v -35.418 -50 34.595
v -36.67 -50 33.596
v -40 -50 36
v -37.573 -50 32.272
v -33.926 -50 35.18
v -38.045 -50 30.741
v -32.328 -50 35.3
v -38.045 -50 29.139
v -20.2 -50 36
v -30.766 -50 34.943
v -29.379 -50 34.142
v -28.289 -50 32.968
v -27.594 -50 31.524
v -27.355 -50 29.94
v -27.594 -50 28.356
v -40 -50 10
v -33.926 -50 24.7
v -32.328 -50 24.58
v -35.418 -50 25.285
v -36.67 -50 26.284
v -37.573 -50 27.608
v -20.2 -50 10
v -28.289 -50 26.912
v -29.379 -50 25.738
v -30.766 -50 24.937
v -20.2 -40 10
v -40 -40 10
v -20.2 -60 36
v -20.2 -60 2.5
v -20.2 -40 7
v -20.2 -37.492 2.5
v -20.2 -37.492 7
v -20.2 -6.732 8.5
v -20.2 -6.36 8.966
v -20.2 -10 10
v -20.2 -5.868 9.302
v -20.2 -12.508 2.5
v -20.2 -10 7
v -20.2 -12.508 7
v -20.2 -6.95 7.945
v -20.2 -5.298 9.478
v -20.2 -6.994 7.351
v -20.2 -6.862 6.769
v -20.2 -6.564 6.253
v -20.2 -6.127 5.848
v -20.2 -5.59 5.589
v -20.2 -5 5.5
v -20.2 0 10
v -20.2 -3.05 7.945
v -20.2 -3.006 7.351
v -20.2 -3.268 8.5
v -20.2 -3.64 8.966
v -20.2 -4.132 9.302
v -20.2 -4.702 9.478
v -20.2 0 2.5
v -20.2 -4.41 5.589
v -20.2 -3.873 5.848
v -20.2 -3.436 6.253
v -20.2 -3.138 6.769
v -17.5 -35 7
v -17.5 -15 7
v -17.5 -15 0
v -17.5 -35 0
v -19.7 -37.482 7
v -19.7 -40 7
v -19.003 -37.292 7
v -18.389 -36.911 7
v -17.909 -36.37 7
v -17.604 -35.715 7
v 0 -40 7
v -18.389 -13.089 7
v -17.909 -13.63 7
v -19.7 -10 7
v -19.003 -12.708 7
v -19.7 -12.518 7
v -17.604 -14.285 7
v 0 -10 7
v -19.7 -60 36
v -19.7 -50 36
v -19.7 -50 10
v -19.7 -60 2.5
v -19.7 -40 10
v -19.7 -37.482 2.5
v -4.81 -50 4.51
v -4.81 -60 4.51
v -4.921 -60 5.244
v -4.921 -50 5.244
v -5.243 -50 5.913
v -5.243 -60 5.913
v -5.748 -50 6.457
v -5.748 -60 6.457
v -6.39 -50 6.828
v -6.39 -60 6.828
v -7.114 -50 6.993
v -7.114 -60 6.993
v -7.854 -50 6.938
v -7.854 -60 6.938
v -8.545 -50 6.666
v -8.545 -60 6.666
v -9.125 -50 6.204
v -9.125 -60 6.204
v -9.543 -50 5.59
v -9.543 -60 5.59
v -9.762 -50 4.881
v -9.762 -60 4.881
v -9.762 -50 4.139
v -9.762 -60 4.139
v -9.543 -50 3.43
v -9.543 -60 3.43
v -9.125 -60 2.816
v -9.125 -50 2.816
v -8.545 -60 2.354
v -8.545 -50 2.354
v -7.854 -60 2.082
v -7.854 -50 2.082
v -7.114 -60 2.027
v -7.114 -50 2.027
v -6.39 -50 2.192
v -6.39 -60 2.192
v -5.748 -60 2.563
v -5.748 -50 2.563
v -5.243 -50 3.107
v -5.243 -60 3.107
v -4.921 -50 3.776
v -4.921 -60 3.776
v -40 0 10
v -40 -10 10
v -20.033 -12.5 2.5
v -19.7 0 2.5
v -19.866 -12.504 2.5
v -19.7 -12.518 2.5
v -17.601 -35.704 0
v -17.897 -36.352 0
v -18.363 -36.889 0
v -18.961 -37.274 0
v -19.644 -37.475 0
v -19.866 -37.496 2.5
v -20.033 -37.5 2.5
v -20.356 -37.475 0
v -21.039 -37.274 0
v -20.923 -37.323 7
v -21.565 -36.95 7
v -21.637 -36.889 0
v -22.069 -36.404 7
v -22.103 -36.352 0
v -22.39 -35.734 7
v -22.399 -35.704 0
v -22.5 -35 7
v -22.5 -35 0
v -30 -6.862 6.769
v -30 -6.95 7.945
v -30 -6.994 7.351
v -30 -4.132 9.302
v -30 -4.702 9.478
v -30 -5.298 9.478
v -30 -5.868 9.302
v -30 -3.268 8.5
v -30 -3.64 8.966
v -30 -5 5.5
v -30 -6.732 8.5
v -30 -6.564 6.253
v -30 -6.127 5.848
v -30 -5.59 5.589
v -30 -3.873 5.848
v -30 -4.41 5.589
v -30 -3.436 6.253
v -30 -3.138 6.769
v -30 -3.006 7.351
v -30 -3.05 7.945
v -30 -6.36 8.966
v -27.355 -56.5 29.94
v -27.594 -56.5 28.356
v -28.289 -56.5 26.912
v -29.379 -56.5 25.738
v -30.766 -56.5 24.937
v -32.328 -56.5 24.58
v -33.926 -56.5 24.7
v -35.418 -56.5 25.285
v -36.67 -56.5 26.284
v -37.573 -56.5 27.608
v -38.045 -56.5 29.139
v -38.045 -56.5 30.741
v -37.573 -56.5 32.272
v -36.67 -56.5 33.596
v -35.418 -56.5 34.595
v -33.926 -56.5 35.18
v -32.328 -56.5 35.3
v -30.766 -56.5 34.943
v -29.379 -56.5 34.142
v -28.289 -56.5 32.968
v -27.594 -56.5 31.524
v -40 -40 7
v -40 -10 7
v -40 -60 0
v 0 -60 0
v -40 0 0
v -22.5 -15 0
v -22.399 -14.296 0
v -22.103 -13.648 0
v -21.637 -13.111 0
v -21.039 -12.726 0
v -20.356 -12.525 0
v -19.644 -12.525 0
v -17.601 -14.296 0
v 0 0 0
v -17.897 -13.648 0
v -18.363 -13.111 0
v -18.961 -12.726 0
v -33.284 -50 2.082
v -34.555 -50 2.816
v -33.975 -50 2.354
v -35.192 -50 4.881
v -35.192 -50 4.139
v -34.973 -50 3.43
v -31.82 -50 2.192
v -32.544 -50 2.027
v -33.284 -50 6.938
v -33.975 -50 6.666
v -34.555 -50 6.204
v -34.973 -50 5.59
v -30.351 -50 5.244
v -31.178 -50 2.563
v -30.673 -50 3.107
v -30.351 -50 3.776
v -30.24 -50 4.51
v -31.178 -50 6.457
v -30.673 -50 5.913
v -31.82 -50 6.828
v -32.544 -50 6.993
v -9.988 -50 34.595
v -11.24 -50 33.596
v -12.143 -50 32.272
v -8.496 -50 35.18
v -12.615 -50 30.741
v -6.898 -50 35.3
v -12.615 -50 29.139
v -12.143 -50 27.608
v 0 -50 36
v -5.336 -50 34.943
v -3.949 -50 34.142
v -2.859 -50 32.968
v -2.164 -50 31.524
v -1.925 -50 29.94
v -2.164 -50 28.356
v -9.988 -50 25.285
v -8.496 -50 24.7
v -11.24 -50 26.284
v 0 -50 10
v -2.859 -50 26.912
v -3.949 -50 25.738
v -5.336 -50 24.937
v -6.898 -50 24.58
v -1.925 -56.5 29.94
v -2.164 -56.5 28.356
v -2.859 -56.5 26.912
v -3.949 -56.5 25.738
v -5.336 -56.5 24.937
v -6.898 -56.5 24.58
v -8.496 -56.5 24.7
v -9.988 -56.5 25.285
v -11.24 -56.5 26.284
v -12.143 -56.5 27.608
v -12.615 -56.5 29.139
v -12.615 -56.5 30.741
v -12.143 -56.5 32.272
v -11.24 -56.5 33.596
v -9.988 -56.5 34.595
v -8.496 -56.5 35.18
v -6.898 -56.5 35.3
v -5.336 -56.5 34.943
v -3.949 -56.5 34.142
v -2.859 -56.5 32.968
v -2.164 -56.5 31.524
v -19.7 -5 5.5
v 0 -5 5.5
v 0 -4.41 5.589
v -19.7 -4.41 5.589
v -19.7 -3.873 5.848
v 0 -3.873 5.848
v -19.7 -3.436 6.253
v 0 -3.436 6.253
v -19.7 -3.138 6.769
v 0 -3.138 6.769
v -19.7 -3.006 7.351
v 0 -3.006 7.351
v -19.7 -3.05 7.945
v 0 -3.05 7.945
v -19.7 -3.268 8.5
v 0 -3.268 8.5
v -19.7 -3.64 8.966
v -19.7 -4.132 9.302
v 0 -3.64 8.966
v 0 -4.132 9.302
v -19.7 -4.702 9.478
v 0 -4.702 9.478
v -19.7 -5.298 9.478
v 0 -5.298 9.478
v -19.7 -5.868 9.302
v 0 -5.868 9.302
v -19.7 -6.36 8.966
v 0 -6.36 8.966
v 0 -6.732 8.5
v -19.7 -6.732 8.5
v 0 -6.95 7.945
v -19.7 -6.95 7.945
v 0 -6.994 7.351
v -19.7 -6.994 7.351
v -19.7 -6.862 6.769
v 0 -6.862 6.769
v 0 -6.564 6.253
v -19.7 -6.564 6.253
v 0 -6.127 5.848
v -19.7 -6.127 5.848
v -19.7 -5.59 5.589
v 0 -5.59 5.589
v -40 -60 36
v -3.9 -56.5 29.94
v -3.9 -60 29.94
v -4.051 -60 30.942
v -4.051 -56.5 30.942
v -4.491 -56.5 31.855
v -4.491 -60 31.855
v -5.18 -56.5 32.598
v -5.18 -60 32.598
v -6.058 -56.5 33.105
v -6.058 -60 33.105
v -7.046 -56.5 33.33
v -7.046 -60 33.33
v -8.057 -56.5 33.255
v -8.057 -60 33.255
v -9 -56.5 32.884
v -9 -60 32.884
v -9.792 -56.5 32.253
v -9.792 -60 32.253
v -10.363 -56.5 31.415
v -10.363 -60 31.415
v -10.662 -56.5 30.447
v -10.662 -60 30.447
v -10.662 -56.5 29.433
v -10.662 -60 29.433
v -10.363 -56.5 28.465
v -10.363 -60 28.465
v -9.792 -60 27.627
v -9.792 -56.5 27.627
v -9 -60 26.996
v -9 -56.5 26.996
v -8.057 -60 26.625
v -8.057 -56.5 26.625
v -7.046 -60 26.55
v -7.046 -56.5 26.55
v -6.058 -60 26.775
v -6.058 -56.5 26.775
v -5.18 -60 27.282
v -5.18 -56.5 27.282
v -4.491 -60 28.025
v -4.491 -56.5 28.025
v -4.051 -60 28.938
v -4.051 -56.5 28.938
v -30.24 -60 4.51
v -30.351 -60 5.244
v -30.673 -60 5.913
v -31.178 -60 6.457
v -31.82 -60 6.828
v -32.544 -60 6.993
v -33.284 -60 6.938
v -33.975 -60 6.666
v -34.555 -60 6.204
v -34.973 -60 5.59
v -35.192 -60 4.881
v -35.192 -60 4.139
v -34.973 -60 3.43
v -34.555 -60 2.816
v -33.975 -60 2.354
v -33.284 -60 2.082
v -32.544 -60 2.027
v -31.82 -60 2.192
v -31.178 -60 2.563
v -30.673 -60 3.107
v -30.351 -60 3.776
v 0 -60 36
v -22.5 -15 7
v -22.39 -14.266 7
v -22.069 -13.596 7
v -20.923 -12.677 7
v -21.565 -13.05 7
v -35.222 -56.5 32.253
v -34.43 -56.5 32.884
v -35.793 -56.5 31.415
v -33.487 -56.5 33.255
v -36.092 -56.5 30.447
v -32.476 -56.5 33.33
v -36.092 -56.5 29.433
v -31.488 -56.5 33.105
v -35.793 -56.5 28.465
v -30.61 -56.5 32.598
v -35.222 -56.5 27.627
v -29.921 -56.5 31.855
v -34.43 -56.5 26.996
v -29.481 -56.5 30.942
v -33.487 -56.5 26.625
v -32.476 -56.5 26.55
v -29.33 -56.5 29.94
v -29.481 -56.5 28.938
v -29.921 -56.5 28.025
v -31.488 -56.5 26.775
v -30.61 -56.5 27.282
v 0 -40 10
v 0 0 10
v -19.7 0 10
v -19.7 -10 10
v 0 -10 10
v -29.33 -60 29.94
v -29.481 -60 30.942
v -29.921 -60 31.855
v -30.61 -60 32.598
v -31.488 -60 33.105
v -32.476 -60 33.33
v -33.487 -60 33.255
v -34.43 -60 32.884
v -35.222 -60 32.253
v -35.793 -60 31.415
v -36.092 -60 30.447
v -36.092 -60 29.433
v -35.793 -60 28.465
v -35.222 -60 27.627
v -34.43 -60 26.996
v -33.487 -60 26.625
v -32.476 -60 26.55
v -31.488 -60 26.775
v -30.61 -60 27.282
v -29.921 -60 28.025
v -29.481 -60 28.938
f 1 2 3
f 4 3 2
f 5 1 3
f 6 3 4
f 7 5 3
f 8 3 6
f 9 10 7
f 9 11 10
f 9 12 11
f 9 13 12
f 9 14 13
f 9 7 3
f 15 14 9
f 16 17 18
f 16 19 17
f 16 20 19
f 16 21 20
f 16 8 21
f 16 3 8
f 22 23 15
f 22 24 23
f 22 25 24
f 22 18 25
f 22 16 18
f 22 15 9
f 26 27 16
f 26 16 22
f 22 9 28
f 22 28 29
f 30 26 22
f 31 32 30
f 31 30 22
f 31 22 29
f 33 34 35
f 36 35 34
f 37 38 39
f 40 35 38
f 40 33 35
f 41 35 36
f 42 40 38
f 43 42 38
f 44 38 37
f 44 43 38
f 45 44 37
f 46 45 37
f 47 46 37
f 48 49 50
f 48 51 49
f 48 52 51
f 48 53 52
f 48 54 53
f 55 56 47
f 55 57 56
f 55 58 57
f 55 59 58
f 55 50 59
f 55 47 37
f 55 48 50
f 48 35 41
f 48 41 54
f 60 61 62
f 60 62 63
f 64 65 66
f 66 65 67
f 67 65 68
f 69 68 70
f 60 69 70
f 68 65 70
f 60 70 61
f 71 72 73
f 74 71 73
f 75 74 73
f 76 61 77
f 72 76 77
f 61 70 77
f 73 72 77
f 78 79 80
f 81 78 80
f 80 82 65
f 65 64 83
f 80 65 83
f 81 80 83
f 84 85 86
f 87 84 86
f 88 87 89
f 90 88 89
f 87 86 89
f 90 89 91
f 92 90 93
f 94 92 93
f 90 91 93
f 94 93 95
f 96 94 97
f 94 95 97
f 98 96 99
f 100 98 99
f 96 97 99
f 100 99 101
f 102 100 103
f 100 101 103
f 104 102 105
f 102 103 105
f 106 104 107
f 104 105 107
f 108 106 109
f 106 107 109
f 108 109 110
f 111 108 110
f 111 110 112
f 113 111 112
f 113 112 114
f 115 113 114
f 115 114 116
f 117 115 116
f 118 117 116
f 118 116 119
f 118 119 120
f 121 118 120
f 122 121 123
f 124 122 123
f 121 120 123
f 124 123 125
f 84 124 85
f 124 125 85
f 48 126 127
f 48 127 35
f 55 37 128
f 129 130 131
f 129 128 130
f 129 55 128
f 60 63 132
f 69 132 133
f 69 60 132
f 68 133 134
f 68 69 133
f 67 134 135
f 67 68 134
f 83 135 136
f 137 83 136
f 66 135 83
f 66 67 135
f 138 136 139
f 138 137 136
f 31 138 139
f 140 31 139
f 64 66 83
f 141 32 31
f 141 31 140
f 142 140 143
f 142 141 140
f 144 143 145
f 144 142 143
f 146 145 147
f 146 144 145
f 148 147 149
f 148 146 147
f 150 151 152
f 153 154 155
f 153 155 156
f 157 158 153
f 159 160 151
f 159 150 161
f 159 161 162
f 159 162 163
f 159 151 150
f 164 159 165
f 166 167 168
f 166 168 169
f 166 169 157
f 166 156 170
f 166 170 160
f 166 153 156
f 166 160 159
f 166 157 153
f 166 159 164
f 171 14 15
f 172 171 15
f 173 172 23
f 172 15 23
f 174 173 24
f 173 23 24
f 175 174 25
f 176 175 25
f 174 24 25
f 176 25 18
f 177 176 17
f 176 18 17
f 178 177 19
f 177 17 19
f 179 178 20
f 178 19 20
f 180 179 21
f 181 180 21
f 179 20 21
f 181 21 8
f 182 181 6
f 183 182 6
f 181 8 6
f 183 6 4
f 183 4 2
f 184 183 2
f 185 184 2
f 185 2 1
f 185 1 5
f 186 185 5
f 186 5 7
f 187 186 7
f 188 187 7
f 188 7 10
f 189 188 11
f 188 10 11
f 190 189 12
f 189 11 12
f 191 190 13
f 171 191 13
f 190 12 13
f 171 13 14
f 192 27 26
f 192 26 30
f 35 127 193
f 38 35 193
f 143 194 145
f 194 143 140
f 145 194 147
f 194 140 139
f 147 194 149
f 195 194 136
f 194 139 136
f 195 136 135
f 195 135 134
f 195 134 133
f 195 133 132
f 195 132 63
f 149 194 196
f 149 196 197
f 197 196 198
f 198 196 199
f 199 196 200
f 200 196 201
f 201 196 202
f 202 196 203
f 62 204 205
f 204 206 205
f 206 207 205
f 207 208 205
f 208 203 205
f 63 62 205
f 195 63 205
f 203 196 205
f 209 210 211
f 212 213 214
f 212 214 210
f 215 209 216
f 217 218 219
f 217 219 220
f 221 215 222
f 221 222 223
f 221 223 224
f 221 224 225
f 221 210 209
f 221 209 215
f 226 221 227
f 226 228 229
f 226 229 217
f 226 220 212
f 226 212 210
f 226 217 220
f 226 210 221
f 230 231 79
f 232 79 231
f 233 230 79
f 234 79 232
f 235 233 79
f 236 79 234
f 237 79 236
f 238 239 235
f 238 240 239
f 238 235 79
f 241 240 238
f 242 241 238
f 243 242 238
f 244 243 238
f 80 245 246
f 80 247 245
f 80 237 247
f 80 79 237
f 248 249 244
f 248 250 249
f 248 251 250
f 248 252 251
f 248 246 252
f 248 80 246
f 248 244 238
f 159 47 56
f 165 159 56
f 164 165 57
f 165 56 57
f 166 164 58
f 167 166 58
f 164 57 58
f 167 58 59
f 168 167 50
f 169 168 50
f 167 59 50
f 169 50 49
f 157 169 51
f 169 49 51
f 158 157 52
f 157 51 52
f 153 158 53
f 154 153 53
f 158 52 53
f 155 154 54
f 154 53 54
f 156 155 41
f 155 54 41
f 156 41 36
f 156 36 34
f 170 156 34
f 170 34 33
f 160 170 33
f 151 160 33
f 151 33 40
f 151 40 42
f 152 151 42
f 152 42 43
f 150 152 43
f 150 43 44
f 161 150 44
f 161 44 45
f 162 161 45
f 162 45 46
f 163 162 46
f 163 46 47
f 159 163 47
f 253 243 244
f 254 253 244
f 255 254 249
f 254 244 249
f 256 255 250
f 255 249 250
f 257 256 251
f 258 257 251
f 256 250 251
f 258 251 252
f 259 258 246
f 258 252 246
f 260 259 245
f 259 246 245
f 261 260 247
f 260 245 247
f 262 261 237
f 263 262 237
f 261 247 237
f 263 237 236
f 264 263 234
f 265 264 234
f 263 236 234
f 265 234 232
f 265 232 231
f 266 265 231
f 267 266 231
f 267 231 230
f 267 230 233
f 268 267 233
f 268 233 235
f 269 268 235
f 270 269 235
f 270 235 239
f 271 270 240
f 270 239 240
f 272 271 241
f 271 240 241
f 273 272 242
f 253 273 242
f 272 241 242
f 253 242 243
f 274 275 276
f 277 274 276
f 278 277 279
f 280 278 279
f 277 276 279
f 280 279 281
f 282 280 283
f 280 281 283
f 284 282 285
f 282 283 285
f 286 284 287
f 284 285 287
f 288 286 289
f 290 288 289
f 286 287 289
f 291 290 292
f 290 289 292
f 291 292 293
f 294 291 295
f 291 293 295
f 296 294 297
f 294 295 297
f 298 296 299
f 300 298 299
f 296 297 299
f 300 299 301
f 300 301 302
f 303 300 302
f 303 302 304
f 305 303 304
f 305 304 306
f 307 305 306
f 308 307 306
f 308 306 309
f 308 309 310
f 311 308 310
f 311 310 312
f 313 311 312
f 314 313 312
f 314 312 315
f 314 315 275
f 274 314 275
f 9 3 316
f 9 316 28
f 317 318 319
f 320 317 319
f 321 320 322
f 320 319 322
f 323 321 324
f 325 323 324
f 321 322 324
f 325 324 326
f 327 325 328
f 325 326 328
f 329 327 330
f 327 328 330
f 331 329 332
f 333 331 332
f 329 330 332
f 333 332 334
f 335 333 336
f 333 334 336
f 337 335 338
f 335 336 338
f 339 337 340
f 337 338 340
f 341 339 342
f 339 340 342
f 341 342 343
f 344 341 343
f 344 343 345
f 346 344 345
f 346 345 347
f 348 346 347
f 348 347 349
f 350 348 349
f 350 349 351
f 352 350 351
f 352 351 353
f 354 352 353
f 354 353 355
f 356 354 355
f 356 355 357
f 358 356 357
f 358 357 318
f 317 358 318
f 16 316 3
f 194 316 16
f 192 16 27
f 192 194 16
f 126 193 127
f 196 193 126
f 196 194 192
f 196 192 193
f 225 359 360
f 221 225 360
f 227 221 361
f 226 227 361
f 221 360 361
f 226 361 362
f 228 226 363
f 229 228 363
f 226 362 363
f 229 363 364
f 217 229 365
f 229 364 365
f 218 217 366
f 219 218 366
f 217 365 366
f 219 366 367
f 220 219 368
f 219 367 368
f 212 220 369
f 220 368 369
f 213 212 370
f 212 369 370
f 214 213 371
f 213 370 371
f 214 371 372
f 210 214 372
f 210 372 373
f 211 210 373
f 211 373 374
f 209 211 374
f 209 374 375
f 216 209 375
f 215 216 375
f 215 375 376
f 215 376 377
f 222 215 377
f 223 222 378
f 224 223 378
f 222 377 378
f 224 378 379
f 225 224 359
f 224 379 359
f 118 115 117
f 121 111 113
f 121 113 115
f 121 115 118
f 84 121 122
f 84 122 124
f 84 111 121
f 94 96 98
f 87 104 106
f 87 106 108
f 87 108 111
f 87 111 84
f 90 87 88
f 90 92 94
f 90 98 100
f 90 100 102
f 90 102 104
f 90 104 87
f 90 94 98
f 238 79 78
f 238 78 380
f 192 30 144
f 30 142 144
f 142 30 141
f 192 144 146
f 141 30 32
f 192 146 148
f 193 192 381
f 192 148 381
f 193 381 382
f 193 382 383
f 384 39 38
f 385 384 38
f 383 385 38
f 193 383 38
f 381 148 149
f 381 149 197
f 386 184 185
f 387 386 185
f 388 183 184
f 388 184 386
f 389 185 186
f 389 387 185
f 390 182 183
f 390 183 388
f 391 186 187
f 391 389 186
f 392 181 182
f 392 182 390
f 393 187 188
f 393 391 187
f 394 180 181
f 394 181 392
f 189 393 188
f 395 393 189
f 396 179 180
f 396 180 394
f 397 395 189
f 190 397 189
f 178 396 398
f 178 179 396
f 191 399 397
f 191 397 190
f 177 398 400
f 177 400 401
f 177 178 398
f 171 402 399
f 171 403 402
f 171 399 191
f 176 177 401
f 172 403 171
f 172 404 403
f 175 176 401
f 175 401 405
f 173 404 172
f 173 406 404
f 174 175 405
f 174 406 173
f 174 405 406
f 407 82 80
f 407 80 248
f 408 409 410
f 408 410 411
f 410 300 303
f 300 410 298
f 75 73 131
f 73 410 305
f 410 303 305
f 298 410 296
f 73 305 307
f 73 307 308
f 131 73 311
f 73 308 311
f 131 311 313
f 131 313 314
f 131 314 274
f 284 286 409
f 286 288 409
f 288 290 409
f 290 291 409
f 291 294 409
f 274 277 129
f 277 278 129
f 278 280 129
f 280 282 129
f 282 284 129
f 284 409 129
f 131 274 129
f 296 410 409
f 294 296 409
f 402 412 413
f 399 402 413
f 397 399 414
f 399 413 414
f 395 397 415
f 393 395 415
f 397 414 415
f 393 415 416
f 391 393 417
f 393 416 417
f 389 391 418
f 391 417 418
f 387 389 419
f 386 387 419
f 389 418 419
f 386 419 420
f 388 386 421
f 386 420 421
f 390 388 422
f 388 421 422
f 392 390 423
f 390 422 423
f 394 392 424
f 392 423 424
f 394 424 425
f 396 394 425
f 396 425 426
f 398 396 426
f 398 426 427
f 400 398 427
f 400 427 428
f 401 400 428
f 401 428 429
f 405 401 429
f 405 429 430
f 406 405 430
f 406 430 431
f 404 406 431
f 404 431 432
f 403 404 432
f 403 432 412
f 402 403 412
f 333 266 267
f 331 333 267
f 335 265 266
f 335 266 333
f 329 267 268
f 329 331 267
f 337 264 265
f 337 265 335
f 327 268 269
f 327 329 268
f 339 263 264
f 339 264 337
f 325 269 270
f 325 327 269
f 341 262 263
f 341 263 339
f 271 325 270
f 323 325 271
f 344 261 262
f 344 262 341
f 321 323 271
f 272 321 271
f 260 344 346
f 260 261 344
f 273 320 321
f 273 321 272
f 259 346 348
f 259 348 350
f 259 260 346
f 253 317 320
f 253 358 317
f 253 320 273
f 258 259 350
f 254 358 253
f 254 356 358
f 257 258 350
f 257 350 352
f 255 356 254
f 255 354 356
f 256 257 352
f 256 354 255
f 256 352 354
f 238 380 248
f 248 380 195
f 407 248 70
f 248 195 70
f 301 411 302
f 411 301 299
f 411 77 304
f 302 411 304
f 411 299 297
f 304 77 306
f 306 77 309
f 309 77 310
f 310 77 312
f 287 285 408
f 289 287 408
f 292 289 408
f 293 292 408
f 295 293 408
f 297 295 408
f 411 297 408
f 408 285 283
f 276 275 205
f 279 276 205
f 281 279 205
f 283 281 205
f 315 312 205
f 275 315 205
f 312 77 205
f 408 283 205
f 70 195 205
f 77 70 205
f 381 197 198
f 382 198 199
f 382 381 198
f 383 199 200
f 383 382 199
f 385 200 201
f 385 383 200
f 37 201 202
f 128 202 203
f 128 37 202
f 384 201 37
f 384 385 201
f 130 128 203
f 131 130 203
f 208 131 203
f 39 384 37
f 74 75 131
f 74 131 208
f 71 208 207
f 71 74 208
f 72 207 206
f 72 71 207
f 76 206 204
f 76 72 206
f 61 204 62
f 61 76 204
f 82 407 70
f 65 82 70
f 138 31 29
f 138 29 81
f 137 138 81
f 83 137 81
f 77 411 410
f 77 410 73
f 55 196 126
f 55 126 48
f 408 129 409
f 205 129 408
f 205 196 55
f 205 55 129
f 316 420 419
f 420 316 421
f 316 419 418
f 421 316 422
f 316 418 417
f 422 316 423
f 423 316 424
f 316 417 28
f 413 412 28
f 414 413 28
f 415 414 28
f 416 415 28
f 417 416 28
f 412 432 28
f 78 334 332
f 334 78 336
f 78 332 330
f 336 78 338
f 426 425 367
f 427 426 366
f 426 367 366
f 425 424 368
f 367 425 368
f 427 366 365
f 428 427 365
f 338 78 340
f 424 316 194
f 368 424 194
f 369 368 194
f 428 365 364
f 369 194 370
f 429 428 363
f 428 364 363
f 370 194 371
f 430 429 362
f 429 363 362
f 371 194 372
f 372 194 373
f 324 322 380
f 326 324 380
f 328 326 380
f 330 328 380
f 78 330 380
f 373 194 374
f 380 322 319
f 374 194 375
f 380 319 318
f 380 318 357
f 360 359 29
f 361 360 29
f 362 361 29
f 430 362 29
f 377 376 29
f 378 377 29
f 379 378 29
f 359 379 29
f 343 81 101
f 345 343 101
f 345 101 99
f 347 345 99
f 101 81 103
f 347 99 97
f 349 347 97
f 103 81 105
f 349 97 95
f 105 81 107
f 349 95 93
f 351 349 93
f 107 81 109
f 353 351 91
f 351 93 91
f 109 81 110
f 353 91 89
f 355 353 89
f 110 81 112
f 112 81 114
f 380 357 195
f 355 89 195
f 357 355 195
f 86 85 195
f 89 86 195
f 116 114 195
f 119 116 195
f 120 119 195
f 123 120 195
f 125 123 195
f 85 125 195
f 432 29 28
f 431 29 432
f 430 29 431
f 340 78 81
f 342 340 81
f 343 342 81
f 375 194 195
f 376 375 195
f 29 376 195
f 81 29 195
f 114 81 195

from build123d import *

# Parameters (mm, degrees)
SKETCH1_W           = 40
SKETCH1_H           = 60
BOSS_EXTRUDE1_DEPTH = 10
CUT_EXTRUDE1_DEPTH  = 11
SKETCH5_W           = 3
SKETCH5_H           = 30
CUT_EXTRUDE4_DEPTH  = 41
SKETCH6_W           = 40
SKETCH6_H           = 10
BOSS_EXTRUDE2_DEPTH = 26
SKETCH8_W           = 0.5
SKETCH8_H           = 33.5
CUT_EXTRUDE7_DEPTH  = 60
SKETCH10_R          = 2
CUT_EXTRUDE10_DEPTH = 30
SKETCH12_R          = 3.4
SKETCH12_R_2        = 2.49
CUT_EXTRUDE13_DEPTH = 10
SKETCH14_R          = 5.375
CUT_EXTRUDE14_DEPTH = 6.5


with BuildPart() as part:
    # Sketch1 → Boss-Extrude1 (new body)
    with BuildSketch(Plane.XY):
        with Locations((-20, -30)):
            Rectangle(SKETCH1_W, SKETCH1_H)
    extrude(amount=BOSS_EXTRUDE1_DEPTH)

    # Sketch2 → Cut-Extrude1 (cut, through all)
    with BuildSketch(Plane.XY.offset(10)):
        with BuildLine():
            Line((-17.5, -15), (-17.5, -35))
            ThreePointArc((-17.5, -35), (-20, -37.5), (-22.5, -35))
            Line((-22.5, -35), (-22.5, -15))
            ThreePointArc((-22.5, -15), (-20, -12.5), (-17.5, -15))
        make_face()
    extrude(amount=-CUT_EXTRUDE1_DEPTH, mode=Mode.SUBTRACT)

    # Sketch5 → Cut-Extrude4 (cut, through all)
    with BuildSketch(Plane(origin=(0, 0, 0), x_dir=(0, 0, -1), z_dir=(1, 0, 0))):
        with Locations((-8.5, -25)):
            Rectangle(SKETCH5_W, SKETCH5_H)
    extrude(amount=-CUT_EXTRUDE4_DEPTH, mode=Mode.SUBTRACT)

    # Sketch6 → Boss-Extrude2 (add)
    with BuildSketch(Plane.XY.offset(10)):
        with Locations((-20, -55)):
            Rectangle(SKETCH6_W, SKETCH6_H)
    extrude(amount=BOSS_EXTRUDE2_DEPTH)

    # Sketch8 → Cut-Extrude7 (cut)
    with BuildSketch(Plane(origin=(0, 0, 0), x_dir=(1, 0, 0), z_dir=(0, 1, 0))):
        with Locations((-19.95, -19.25)):
            Rectangle(SKETCH8_W, SKETCH8_H)
    extrude(amount=-CUT_EXTRUDE7_DEPTH, mode=Mode.SUBTRACT)

    # Sketch10 → Cut-Extrude10 (cut)
    with BuildSketch(Plane(origin=(0, 0, 0), x_dir=(0, 0, -1), z_dir=(1, 0, 0))):
        with Locations((-7.5, -5)):
            Circle(SKETCH10_R)
    extrude(amount=-CUT_EXTRUDE10_DEPTH, mode=Mode.SUBTRACT)

    # Sketch12 → Cut-Extrude13 (cut)
    with BuildSketch(Plane.XZ.offset(60)):
        with Locations((-7.3, 29.94)):
            Circle(SKETCH12_R)
        with Locations((-32.73, 29.94)):
            Circle(SKETCH12_R)
        with Locations((-32.73, 4.51)):
            Circle(SKETCH12_R_2)
        with Locations((-7.3, 4.51)):
            Circle(SKETCH12_R_2)
    extrude(amount=-CUT_EXTRUDE13_DEPTH, mode=Mode.SUBTRACT)

    # Sketch14 → Cut-Extrude14 (cut)
    with BuildSketch(Plane(origin=(0, -50, 0), x_dir=(1, 0, 0), z_dir=(0, 1, 0))):
        with Locations((-32.73, -29.94)):
            Circle(SKETCH14_R)
        with Locations((-7.3, -29.94)):
            Circle(SKETCH14_R)
    extrude(amount=-CUT_EXTRUDE14_DEPTH, mode=Mode.SUBTRACT)


solid = part.part
